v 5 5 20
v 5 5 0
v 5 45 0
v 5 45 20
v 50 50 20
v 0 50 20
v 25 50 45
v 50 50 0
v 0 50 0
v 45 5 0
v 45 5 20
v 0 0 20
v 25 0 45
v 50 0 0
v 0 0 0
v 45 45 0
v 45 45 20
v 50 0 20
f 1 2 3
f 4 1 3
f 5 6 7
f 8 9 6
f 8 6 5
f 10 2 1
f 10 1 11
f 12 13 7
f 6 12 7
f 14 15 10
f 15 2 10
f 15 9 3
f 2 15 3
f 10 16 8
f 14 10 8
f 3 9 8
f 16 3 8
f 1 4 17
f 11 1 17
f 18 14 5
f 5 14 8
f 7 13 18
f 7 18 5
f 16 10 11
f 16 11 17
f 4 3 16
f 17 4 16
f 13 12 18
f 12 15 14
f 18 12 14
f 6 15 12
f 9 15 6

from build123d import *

# Parameters (mm, degrees)
F0_W     = 50
F0_H     = 50
F0_W_2   = 40
F0_H_2   = 40
F1_DEPTH = 20
F2_W     = 50
F2_H     = 50
F3_DEPTH = 25
F4_SIZE  = 24.99999


# Not quite as in the source:
# - a fillet or chamfer is up to 0.001 mm smaller than in the source, because OpenCascade refuses the exact size


with BuildPart() as f1:
    # F0 (on Top) → F1 (new body)
    with BuildSketch(Plane.XY):
        with Locations((25, 25)):
            Rectangle(F0_W, F0_H)
        with Locations((25, 25)):
            Rectangle(F0_W_2, F0_H_2, mode=Mode.SUBTRACT)
    extrude(amount=F1_DEPTH)

    # F2 (on face) → F3 (join)
    with BuildSketch(Plane.XY.offset(20)):
        with Locations((25, 25)):
            Rectangle(F2_W, F2_H)
    extrude(amount=F3_DEPTH)

    # F4 (size 25 in the source; OpenCascade refuses exactly that, so slightly less here)
    f4_edges = [f1.edges().sort_by_distance(p)[0] for p in [
        (0, 25, 45),
        (50, 25, 45),
    ]]
    chamfer(f4_edges, length=F4_SIZE)


solid = f1.part
